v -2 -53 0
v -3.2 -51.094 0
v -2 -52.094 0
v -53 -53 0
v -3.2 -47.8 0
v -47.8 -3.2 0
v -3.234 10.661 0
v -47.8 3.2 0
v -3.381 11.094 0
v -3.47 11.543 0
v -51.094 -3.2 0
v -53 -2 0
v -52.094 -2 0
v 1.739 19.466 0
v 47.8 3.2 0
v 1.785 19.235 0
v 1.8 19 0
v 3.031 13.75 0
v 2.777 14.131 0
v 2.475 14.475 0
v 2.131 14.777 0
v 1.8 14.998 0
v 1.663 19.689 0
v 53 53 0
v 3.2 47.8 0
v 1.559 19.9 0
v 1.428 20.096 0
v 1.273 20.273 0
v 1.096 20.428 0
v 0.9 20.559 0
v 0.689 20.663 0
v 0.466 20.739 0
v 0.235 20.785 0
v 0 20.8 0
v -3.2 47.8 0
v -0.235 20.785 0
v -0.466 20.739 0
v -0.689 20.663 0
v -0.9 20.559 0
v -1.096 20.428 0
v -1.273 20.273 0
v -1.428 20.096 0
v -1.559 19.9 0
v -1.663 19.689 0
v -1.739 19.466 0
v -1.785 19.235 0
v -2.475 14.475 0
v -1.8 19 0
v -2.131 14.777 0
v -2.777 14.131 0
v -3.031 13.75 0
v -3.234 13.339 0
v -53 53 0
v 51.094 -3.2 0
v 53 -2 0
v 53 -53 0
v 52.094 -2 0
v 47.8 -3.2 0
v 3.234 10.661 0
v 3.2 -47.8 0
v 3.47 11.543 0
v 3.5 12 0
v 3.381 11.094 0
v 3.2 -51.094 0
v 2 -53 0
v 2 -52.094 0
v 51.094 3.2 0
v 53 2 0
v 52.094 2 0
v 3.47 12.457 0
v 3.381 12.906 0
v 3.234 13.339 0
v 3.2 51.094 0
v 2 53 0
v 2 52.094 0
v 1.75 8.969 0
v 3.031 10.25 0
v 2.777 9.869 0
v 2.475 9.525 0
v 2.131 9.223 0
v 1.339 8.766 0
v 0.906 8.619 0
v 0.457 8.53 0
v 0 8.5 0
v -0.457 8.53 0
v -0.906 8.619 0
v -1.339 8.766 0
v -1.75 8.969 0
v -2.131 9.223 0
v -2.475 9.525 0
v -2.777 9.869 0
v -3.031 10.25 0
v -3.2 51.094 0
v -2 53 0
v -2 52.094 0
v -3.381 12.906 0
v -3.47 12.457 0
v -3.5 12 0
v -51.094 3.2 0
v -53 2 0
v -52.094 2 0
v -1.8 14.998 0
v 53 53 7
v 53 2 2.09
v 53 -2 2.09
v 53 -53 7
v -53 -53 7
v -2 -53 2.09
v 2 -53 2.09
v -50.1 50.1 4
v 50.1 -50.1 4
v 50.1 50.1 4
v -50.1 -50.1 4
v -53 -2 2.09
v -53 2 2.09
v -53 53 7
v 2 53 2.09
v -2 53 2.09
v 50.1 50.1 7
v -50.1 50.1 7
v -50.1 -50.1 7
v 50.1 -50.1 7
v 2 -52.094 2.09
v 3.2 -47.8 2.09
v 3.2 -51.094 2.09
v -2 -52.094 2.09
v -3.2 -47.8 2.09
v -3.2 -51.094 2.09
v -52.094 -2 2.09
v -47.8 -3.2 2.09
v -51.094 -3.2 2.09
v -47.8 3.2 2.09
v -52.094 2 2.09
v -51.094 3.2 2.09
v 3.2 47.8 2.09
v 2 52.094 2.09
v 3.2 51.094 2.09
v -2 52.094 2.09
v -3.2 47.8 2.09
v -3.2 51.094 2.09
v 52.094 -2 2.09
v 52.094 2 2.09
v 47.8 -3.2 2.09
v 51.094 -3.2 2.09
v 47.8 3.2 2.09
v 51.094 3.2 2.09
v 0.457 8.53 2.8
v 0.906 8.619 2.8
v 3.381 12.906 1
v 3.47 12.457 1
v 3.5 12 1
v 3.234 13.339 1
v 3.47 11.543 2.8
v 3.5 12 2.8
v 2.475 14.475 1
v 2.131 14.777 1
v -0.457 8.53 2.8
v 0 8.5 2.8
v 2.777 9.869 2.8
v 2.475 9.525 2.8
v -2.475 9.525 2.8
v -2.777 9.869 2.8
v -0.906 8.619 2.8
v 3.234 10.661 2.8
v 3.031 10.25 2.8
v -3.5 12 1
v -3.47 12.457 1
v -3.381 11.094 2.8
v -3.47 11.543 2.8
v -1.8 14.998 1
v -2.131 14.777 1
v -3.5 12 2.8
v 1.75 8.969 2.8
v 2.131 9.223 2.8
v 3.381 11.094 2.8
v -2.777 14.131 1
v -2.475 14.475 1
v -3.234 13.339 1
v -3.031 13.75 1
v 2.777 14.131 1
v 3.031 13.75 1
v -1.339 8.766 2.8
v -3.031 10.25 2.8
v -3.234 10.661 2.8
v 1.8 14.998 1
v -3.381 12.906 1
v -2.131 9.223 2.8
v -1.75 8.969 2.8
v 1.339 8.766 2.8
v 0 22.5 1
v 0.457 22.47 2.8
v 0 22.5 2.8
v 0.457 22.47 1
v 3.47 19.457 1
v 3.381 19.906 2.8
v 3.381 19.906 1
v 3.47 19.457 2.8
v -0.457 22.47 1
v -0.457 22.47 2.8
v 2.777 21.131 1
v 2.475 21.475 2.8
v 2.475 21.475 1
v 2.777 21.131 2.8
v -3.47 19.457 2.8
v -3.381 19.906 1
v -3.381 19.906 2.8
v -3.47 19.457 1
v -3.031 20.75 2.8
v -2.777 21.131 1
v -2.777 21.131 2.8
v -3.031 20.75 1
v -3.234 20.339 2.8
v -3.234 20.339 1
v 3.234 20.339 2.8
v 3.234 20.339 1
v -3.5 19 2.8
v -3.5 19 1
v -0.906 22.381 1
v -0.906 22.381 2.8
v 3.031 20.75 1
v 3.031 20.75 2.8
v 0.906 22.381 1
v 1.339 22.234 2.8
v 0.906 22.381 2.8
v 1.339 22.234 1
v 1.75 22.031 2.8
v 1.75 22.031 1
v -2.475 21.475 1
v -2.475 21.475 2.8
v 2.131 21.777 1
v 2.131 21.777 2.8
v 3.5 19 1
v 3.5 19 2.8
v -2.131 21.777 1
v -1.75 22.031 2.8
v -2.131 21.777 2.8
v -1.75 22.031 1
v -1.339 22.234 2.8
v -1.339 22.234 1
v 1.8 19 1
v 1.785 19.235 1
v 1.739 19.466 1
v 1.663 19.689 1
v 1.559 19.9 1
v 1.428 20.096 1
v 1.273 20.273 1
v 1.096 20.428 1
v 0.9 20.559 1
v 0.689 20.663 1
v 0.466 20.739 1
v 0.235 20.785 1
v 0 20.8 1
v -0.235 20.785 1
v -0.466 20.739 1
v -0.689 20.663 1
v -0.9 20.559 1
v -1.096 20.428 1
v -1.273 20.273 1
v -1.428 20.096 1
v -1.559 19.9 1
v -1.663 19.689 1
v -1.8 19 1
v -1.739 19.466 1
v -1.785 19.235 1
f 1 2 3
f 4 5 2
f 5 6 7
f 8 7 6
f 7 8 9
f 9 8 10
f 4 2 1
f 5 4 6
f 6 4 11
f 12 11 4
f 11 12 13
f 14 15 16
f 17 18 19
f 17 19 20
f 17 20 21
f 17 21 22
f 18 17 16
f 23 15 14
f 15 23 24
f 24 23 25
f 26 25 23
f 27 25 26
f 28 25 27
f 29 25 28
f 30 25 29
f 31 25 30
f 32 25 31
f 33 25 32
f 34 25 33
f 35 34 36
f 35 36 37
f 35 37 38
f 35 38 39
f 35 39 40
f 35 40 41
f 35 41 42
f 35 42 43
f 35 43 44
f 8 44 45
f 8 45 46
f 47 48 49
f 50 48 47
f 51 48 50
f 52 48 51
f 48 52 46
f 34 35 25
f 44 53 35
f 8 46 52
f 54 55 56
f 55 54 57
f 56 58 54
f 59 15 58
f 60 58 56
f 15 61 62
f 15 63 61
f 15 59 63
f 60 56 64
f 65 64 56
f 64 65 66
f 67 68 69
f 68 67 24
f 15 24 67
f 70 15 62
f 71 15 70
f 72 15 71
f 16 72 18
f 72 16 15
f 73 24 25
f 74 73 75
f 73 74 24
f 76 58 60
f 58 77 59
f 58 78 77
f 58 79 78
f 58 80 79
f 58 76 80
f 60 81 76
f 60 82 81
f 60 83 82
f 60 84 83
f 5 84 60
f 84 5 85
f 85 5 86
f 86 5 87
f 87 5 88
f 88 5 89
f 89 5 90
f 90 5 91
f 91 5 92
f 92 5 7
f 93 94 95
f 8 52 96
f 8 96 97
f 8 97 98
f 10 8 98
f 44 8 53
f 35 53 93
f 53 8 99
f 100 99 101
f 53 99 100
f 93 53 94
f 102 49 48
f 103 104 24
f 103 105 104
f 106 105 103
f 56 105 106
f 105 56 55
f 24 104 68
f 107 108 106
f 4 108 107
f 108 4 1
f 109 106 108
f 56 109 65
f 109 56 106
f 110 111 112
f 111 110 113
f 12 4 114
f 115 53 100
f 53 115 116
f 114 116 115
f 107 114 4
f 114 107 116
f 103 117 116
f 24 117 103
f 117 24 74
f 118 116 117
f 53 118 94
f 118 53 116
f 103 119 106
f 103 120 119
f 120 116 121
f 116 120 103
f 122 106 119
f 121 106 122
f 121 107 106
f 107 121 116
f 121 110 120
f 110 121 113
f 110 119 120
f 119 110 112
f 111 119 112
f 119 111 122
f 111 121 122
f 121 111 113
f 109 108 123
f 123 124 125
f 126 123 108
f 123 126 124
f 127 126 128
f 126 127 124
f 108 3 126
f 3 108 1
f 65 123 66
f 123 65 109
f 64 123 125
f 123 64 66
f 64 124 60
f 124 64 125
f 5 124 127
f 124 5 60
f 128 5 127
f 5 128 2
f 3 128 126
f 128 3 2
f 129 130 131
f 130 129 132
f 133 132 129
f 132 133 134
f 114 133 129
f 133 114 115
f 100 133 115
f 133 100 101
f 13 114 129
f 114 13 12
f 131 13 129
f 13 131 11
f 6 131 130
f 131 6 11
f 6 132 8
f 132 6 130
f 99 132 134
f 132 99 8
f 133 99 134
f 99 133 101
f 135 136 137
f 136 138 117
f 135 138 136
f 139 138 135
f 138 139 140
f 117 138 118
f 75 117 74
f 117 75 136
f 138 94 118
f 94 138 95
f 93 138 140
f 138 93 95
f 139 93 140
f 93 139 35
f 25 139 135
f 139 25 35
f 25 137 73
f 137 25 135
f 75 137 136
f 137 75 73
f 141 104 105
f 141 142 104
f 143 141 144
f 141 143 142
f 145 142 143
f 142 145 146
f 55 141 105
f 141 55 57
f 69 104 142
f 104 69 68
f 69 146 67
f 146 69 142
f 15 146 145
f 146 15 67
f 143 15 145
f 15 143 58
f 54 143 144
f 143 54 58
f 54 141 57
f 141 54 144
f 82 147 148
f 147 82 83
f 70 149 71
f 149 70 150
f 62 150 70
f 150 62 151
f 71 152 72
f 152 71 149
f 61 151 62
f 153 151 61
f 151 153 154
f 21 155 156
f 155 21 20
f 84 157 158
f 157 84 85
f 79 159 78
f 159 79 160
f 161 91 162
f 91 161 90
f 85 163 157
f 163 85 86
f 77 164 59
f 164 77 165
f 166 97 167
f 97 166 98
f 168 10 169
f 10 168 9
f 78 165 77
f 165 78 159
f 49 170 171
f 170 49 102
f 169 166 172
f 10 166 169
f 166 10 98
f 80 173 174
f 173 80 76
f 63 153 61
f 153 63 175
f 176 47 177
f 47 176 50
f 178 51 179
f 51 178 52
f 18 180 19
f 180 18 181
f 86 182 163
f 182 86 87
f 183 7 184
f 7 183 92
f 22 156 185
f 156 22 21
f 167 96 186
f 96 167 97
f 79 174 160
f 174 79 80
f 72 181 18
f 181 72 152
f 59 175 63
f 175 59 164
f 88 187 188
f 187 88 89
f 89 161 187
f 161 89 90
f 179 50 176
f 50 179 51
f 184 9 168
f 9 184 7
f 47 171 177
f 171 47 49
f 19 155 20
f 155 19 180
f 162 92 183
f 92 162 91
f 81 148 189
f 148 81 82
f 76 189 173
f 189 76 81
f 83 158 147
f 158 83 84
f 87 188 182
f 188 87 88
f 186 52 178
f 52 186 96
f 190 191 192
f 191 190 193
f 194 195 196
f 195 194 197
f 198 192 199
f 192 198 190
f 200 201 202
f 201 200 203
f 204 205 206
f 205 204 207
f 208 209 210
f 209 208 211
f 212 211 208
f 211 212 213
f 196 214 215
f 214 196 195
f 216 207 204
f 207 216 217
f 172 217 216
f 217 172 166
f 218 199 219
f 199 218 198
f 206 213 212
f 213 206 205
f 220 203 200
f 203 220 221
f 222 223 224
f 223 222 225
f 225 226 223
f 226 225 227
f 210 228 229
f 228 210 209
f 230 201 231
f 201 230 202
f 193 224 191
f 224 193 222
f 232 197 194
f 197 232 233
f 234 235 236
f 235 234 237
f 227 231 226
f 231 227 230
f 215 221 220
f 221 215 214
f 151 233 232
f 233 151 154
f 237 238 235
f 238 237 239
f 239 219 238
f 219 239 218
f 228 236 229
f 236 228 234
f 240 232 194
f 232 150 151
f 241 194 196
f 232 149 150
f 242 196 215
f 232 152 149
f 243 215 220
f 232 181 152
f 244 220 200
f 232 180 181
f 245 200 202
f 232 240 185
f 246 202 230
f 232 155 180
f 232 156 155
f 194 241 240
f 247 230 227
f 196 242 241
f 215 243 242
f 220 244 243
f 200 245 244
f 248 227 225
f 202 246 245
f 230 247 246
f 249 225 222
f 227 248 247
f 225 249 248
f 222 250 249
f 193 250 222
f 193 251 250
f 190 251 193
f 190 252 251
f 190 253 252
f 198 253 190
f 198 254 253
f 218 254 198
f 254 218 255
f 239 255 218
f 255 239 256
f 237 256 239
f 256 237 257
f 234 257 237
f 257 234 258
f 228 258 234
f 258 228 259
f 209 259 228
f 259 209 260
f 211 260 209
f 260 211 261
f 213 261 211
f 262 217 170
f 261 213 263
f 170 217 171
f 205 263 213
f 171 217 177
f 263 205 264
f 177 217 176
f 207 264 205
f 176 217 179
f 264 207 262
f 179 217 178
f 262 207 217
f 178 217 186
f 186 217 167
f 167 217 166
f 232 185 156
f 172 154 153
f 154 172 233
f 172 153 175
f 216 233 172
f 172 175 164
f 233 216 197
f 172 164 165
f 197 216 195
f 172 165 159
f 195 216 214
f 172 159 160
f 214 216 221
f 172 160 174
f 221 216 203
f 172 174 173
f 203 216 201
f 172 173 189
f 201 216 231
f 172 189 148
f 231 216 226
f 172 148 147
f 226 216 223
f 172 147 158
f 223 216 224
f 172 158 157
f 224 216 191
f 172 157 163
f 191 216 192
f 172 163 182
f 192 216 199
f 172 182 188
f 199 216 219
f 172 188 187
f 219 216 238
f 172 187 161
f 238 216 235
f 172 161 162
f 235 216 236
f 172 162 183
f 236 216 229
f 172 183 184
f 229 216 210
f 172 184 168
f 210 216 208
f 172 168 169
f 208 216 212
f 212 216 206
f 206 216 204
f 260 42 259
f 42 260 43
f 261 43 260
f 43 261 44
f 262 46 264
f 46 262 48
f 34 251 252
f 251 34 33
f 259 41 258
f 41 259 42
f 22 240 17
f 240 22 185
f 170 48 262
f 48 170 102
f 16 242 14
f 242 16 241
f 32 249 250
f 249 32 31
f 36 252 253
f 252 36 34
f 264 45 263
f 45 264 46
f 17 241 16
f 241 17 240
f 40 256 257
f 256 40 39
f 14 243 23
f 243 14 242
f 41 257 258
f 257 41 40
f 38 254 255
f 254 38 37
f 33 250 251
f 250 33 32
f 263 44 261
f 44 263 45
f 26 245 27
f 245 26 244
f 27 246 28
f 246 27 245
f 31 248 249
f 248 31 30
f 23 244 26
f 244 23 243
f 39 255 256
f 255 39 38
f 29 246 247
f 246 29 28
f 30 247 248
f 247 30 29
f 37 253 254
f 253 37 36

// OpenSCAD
// Contour Studio square holder. mm. Same sockets and keyhole as modular map holders.
$fn=48; tile=100; gap=6; tolerance=.2; seat=4; rim=3;
module tile_shape(){polygon([[50.0, -50.0], [50.0, 50.0], [-50.0, 50.0], [-50.0, -50.0]]);}
module key_shape(){polygon([[-5,-3],[-2,-3],[-1,-1.8],[1,-1.8],[2,-3],[5,-3],[5,3],[2,3],[1,1.8],[-1,1.8],[-2,3],[-5,3]]);}
difference(){
 union(){linear_extrude(seat) offset(delta=gap/2) tile_shape();translate([0,0,seat]) linear_extrude(rim) difference(){offset(delta=gap/2) tile_shape();offset(delta=tolerance/2) tile_shape();}}
translate([0.0,-53.0,-.01]) rotate([0,0,-90.0]) linear_extrude(2.1) offset(delta=tolerance) key_shape();
translate([-53.0,0.0,-.01]) rotate([0,0,180.0]) linear_extrude(2.1) offset(delta=tolerance) key_shape();
translate([0.0,53.0,-.01]) rotate([0,0,90.0]) linear_extrude(2.1) offset(delta=tolerance) key_shape();
translate([53.0,0.0,-.01]) rotate([0,0,0.0]) linear_extrude(2.1) offset(delta=tolerance) key_shape();
translate([0,12.0,-.01]) cylinder(h=2.8,r=3.5);
translate([0,12.0,1]) linear_extrude(1.8) hull(){circle(r=3.5);translate([0,7]) circle(r=3.5);}
translate([0,12.0,-.01]) linear_extrude(1.1) hull(){circle(r=1.8);translate([0,7]) circle(r=1.8);}
}
